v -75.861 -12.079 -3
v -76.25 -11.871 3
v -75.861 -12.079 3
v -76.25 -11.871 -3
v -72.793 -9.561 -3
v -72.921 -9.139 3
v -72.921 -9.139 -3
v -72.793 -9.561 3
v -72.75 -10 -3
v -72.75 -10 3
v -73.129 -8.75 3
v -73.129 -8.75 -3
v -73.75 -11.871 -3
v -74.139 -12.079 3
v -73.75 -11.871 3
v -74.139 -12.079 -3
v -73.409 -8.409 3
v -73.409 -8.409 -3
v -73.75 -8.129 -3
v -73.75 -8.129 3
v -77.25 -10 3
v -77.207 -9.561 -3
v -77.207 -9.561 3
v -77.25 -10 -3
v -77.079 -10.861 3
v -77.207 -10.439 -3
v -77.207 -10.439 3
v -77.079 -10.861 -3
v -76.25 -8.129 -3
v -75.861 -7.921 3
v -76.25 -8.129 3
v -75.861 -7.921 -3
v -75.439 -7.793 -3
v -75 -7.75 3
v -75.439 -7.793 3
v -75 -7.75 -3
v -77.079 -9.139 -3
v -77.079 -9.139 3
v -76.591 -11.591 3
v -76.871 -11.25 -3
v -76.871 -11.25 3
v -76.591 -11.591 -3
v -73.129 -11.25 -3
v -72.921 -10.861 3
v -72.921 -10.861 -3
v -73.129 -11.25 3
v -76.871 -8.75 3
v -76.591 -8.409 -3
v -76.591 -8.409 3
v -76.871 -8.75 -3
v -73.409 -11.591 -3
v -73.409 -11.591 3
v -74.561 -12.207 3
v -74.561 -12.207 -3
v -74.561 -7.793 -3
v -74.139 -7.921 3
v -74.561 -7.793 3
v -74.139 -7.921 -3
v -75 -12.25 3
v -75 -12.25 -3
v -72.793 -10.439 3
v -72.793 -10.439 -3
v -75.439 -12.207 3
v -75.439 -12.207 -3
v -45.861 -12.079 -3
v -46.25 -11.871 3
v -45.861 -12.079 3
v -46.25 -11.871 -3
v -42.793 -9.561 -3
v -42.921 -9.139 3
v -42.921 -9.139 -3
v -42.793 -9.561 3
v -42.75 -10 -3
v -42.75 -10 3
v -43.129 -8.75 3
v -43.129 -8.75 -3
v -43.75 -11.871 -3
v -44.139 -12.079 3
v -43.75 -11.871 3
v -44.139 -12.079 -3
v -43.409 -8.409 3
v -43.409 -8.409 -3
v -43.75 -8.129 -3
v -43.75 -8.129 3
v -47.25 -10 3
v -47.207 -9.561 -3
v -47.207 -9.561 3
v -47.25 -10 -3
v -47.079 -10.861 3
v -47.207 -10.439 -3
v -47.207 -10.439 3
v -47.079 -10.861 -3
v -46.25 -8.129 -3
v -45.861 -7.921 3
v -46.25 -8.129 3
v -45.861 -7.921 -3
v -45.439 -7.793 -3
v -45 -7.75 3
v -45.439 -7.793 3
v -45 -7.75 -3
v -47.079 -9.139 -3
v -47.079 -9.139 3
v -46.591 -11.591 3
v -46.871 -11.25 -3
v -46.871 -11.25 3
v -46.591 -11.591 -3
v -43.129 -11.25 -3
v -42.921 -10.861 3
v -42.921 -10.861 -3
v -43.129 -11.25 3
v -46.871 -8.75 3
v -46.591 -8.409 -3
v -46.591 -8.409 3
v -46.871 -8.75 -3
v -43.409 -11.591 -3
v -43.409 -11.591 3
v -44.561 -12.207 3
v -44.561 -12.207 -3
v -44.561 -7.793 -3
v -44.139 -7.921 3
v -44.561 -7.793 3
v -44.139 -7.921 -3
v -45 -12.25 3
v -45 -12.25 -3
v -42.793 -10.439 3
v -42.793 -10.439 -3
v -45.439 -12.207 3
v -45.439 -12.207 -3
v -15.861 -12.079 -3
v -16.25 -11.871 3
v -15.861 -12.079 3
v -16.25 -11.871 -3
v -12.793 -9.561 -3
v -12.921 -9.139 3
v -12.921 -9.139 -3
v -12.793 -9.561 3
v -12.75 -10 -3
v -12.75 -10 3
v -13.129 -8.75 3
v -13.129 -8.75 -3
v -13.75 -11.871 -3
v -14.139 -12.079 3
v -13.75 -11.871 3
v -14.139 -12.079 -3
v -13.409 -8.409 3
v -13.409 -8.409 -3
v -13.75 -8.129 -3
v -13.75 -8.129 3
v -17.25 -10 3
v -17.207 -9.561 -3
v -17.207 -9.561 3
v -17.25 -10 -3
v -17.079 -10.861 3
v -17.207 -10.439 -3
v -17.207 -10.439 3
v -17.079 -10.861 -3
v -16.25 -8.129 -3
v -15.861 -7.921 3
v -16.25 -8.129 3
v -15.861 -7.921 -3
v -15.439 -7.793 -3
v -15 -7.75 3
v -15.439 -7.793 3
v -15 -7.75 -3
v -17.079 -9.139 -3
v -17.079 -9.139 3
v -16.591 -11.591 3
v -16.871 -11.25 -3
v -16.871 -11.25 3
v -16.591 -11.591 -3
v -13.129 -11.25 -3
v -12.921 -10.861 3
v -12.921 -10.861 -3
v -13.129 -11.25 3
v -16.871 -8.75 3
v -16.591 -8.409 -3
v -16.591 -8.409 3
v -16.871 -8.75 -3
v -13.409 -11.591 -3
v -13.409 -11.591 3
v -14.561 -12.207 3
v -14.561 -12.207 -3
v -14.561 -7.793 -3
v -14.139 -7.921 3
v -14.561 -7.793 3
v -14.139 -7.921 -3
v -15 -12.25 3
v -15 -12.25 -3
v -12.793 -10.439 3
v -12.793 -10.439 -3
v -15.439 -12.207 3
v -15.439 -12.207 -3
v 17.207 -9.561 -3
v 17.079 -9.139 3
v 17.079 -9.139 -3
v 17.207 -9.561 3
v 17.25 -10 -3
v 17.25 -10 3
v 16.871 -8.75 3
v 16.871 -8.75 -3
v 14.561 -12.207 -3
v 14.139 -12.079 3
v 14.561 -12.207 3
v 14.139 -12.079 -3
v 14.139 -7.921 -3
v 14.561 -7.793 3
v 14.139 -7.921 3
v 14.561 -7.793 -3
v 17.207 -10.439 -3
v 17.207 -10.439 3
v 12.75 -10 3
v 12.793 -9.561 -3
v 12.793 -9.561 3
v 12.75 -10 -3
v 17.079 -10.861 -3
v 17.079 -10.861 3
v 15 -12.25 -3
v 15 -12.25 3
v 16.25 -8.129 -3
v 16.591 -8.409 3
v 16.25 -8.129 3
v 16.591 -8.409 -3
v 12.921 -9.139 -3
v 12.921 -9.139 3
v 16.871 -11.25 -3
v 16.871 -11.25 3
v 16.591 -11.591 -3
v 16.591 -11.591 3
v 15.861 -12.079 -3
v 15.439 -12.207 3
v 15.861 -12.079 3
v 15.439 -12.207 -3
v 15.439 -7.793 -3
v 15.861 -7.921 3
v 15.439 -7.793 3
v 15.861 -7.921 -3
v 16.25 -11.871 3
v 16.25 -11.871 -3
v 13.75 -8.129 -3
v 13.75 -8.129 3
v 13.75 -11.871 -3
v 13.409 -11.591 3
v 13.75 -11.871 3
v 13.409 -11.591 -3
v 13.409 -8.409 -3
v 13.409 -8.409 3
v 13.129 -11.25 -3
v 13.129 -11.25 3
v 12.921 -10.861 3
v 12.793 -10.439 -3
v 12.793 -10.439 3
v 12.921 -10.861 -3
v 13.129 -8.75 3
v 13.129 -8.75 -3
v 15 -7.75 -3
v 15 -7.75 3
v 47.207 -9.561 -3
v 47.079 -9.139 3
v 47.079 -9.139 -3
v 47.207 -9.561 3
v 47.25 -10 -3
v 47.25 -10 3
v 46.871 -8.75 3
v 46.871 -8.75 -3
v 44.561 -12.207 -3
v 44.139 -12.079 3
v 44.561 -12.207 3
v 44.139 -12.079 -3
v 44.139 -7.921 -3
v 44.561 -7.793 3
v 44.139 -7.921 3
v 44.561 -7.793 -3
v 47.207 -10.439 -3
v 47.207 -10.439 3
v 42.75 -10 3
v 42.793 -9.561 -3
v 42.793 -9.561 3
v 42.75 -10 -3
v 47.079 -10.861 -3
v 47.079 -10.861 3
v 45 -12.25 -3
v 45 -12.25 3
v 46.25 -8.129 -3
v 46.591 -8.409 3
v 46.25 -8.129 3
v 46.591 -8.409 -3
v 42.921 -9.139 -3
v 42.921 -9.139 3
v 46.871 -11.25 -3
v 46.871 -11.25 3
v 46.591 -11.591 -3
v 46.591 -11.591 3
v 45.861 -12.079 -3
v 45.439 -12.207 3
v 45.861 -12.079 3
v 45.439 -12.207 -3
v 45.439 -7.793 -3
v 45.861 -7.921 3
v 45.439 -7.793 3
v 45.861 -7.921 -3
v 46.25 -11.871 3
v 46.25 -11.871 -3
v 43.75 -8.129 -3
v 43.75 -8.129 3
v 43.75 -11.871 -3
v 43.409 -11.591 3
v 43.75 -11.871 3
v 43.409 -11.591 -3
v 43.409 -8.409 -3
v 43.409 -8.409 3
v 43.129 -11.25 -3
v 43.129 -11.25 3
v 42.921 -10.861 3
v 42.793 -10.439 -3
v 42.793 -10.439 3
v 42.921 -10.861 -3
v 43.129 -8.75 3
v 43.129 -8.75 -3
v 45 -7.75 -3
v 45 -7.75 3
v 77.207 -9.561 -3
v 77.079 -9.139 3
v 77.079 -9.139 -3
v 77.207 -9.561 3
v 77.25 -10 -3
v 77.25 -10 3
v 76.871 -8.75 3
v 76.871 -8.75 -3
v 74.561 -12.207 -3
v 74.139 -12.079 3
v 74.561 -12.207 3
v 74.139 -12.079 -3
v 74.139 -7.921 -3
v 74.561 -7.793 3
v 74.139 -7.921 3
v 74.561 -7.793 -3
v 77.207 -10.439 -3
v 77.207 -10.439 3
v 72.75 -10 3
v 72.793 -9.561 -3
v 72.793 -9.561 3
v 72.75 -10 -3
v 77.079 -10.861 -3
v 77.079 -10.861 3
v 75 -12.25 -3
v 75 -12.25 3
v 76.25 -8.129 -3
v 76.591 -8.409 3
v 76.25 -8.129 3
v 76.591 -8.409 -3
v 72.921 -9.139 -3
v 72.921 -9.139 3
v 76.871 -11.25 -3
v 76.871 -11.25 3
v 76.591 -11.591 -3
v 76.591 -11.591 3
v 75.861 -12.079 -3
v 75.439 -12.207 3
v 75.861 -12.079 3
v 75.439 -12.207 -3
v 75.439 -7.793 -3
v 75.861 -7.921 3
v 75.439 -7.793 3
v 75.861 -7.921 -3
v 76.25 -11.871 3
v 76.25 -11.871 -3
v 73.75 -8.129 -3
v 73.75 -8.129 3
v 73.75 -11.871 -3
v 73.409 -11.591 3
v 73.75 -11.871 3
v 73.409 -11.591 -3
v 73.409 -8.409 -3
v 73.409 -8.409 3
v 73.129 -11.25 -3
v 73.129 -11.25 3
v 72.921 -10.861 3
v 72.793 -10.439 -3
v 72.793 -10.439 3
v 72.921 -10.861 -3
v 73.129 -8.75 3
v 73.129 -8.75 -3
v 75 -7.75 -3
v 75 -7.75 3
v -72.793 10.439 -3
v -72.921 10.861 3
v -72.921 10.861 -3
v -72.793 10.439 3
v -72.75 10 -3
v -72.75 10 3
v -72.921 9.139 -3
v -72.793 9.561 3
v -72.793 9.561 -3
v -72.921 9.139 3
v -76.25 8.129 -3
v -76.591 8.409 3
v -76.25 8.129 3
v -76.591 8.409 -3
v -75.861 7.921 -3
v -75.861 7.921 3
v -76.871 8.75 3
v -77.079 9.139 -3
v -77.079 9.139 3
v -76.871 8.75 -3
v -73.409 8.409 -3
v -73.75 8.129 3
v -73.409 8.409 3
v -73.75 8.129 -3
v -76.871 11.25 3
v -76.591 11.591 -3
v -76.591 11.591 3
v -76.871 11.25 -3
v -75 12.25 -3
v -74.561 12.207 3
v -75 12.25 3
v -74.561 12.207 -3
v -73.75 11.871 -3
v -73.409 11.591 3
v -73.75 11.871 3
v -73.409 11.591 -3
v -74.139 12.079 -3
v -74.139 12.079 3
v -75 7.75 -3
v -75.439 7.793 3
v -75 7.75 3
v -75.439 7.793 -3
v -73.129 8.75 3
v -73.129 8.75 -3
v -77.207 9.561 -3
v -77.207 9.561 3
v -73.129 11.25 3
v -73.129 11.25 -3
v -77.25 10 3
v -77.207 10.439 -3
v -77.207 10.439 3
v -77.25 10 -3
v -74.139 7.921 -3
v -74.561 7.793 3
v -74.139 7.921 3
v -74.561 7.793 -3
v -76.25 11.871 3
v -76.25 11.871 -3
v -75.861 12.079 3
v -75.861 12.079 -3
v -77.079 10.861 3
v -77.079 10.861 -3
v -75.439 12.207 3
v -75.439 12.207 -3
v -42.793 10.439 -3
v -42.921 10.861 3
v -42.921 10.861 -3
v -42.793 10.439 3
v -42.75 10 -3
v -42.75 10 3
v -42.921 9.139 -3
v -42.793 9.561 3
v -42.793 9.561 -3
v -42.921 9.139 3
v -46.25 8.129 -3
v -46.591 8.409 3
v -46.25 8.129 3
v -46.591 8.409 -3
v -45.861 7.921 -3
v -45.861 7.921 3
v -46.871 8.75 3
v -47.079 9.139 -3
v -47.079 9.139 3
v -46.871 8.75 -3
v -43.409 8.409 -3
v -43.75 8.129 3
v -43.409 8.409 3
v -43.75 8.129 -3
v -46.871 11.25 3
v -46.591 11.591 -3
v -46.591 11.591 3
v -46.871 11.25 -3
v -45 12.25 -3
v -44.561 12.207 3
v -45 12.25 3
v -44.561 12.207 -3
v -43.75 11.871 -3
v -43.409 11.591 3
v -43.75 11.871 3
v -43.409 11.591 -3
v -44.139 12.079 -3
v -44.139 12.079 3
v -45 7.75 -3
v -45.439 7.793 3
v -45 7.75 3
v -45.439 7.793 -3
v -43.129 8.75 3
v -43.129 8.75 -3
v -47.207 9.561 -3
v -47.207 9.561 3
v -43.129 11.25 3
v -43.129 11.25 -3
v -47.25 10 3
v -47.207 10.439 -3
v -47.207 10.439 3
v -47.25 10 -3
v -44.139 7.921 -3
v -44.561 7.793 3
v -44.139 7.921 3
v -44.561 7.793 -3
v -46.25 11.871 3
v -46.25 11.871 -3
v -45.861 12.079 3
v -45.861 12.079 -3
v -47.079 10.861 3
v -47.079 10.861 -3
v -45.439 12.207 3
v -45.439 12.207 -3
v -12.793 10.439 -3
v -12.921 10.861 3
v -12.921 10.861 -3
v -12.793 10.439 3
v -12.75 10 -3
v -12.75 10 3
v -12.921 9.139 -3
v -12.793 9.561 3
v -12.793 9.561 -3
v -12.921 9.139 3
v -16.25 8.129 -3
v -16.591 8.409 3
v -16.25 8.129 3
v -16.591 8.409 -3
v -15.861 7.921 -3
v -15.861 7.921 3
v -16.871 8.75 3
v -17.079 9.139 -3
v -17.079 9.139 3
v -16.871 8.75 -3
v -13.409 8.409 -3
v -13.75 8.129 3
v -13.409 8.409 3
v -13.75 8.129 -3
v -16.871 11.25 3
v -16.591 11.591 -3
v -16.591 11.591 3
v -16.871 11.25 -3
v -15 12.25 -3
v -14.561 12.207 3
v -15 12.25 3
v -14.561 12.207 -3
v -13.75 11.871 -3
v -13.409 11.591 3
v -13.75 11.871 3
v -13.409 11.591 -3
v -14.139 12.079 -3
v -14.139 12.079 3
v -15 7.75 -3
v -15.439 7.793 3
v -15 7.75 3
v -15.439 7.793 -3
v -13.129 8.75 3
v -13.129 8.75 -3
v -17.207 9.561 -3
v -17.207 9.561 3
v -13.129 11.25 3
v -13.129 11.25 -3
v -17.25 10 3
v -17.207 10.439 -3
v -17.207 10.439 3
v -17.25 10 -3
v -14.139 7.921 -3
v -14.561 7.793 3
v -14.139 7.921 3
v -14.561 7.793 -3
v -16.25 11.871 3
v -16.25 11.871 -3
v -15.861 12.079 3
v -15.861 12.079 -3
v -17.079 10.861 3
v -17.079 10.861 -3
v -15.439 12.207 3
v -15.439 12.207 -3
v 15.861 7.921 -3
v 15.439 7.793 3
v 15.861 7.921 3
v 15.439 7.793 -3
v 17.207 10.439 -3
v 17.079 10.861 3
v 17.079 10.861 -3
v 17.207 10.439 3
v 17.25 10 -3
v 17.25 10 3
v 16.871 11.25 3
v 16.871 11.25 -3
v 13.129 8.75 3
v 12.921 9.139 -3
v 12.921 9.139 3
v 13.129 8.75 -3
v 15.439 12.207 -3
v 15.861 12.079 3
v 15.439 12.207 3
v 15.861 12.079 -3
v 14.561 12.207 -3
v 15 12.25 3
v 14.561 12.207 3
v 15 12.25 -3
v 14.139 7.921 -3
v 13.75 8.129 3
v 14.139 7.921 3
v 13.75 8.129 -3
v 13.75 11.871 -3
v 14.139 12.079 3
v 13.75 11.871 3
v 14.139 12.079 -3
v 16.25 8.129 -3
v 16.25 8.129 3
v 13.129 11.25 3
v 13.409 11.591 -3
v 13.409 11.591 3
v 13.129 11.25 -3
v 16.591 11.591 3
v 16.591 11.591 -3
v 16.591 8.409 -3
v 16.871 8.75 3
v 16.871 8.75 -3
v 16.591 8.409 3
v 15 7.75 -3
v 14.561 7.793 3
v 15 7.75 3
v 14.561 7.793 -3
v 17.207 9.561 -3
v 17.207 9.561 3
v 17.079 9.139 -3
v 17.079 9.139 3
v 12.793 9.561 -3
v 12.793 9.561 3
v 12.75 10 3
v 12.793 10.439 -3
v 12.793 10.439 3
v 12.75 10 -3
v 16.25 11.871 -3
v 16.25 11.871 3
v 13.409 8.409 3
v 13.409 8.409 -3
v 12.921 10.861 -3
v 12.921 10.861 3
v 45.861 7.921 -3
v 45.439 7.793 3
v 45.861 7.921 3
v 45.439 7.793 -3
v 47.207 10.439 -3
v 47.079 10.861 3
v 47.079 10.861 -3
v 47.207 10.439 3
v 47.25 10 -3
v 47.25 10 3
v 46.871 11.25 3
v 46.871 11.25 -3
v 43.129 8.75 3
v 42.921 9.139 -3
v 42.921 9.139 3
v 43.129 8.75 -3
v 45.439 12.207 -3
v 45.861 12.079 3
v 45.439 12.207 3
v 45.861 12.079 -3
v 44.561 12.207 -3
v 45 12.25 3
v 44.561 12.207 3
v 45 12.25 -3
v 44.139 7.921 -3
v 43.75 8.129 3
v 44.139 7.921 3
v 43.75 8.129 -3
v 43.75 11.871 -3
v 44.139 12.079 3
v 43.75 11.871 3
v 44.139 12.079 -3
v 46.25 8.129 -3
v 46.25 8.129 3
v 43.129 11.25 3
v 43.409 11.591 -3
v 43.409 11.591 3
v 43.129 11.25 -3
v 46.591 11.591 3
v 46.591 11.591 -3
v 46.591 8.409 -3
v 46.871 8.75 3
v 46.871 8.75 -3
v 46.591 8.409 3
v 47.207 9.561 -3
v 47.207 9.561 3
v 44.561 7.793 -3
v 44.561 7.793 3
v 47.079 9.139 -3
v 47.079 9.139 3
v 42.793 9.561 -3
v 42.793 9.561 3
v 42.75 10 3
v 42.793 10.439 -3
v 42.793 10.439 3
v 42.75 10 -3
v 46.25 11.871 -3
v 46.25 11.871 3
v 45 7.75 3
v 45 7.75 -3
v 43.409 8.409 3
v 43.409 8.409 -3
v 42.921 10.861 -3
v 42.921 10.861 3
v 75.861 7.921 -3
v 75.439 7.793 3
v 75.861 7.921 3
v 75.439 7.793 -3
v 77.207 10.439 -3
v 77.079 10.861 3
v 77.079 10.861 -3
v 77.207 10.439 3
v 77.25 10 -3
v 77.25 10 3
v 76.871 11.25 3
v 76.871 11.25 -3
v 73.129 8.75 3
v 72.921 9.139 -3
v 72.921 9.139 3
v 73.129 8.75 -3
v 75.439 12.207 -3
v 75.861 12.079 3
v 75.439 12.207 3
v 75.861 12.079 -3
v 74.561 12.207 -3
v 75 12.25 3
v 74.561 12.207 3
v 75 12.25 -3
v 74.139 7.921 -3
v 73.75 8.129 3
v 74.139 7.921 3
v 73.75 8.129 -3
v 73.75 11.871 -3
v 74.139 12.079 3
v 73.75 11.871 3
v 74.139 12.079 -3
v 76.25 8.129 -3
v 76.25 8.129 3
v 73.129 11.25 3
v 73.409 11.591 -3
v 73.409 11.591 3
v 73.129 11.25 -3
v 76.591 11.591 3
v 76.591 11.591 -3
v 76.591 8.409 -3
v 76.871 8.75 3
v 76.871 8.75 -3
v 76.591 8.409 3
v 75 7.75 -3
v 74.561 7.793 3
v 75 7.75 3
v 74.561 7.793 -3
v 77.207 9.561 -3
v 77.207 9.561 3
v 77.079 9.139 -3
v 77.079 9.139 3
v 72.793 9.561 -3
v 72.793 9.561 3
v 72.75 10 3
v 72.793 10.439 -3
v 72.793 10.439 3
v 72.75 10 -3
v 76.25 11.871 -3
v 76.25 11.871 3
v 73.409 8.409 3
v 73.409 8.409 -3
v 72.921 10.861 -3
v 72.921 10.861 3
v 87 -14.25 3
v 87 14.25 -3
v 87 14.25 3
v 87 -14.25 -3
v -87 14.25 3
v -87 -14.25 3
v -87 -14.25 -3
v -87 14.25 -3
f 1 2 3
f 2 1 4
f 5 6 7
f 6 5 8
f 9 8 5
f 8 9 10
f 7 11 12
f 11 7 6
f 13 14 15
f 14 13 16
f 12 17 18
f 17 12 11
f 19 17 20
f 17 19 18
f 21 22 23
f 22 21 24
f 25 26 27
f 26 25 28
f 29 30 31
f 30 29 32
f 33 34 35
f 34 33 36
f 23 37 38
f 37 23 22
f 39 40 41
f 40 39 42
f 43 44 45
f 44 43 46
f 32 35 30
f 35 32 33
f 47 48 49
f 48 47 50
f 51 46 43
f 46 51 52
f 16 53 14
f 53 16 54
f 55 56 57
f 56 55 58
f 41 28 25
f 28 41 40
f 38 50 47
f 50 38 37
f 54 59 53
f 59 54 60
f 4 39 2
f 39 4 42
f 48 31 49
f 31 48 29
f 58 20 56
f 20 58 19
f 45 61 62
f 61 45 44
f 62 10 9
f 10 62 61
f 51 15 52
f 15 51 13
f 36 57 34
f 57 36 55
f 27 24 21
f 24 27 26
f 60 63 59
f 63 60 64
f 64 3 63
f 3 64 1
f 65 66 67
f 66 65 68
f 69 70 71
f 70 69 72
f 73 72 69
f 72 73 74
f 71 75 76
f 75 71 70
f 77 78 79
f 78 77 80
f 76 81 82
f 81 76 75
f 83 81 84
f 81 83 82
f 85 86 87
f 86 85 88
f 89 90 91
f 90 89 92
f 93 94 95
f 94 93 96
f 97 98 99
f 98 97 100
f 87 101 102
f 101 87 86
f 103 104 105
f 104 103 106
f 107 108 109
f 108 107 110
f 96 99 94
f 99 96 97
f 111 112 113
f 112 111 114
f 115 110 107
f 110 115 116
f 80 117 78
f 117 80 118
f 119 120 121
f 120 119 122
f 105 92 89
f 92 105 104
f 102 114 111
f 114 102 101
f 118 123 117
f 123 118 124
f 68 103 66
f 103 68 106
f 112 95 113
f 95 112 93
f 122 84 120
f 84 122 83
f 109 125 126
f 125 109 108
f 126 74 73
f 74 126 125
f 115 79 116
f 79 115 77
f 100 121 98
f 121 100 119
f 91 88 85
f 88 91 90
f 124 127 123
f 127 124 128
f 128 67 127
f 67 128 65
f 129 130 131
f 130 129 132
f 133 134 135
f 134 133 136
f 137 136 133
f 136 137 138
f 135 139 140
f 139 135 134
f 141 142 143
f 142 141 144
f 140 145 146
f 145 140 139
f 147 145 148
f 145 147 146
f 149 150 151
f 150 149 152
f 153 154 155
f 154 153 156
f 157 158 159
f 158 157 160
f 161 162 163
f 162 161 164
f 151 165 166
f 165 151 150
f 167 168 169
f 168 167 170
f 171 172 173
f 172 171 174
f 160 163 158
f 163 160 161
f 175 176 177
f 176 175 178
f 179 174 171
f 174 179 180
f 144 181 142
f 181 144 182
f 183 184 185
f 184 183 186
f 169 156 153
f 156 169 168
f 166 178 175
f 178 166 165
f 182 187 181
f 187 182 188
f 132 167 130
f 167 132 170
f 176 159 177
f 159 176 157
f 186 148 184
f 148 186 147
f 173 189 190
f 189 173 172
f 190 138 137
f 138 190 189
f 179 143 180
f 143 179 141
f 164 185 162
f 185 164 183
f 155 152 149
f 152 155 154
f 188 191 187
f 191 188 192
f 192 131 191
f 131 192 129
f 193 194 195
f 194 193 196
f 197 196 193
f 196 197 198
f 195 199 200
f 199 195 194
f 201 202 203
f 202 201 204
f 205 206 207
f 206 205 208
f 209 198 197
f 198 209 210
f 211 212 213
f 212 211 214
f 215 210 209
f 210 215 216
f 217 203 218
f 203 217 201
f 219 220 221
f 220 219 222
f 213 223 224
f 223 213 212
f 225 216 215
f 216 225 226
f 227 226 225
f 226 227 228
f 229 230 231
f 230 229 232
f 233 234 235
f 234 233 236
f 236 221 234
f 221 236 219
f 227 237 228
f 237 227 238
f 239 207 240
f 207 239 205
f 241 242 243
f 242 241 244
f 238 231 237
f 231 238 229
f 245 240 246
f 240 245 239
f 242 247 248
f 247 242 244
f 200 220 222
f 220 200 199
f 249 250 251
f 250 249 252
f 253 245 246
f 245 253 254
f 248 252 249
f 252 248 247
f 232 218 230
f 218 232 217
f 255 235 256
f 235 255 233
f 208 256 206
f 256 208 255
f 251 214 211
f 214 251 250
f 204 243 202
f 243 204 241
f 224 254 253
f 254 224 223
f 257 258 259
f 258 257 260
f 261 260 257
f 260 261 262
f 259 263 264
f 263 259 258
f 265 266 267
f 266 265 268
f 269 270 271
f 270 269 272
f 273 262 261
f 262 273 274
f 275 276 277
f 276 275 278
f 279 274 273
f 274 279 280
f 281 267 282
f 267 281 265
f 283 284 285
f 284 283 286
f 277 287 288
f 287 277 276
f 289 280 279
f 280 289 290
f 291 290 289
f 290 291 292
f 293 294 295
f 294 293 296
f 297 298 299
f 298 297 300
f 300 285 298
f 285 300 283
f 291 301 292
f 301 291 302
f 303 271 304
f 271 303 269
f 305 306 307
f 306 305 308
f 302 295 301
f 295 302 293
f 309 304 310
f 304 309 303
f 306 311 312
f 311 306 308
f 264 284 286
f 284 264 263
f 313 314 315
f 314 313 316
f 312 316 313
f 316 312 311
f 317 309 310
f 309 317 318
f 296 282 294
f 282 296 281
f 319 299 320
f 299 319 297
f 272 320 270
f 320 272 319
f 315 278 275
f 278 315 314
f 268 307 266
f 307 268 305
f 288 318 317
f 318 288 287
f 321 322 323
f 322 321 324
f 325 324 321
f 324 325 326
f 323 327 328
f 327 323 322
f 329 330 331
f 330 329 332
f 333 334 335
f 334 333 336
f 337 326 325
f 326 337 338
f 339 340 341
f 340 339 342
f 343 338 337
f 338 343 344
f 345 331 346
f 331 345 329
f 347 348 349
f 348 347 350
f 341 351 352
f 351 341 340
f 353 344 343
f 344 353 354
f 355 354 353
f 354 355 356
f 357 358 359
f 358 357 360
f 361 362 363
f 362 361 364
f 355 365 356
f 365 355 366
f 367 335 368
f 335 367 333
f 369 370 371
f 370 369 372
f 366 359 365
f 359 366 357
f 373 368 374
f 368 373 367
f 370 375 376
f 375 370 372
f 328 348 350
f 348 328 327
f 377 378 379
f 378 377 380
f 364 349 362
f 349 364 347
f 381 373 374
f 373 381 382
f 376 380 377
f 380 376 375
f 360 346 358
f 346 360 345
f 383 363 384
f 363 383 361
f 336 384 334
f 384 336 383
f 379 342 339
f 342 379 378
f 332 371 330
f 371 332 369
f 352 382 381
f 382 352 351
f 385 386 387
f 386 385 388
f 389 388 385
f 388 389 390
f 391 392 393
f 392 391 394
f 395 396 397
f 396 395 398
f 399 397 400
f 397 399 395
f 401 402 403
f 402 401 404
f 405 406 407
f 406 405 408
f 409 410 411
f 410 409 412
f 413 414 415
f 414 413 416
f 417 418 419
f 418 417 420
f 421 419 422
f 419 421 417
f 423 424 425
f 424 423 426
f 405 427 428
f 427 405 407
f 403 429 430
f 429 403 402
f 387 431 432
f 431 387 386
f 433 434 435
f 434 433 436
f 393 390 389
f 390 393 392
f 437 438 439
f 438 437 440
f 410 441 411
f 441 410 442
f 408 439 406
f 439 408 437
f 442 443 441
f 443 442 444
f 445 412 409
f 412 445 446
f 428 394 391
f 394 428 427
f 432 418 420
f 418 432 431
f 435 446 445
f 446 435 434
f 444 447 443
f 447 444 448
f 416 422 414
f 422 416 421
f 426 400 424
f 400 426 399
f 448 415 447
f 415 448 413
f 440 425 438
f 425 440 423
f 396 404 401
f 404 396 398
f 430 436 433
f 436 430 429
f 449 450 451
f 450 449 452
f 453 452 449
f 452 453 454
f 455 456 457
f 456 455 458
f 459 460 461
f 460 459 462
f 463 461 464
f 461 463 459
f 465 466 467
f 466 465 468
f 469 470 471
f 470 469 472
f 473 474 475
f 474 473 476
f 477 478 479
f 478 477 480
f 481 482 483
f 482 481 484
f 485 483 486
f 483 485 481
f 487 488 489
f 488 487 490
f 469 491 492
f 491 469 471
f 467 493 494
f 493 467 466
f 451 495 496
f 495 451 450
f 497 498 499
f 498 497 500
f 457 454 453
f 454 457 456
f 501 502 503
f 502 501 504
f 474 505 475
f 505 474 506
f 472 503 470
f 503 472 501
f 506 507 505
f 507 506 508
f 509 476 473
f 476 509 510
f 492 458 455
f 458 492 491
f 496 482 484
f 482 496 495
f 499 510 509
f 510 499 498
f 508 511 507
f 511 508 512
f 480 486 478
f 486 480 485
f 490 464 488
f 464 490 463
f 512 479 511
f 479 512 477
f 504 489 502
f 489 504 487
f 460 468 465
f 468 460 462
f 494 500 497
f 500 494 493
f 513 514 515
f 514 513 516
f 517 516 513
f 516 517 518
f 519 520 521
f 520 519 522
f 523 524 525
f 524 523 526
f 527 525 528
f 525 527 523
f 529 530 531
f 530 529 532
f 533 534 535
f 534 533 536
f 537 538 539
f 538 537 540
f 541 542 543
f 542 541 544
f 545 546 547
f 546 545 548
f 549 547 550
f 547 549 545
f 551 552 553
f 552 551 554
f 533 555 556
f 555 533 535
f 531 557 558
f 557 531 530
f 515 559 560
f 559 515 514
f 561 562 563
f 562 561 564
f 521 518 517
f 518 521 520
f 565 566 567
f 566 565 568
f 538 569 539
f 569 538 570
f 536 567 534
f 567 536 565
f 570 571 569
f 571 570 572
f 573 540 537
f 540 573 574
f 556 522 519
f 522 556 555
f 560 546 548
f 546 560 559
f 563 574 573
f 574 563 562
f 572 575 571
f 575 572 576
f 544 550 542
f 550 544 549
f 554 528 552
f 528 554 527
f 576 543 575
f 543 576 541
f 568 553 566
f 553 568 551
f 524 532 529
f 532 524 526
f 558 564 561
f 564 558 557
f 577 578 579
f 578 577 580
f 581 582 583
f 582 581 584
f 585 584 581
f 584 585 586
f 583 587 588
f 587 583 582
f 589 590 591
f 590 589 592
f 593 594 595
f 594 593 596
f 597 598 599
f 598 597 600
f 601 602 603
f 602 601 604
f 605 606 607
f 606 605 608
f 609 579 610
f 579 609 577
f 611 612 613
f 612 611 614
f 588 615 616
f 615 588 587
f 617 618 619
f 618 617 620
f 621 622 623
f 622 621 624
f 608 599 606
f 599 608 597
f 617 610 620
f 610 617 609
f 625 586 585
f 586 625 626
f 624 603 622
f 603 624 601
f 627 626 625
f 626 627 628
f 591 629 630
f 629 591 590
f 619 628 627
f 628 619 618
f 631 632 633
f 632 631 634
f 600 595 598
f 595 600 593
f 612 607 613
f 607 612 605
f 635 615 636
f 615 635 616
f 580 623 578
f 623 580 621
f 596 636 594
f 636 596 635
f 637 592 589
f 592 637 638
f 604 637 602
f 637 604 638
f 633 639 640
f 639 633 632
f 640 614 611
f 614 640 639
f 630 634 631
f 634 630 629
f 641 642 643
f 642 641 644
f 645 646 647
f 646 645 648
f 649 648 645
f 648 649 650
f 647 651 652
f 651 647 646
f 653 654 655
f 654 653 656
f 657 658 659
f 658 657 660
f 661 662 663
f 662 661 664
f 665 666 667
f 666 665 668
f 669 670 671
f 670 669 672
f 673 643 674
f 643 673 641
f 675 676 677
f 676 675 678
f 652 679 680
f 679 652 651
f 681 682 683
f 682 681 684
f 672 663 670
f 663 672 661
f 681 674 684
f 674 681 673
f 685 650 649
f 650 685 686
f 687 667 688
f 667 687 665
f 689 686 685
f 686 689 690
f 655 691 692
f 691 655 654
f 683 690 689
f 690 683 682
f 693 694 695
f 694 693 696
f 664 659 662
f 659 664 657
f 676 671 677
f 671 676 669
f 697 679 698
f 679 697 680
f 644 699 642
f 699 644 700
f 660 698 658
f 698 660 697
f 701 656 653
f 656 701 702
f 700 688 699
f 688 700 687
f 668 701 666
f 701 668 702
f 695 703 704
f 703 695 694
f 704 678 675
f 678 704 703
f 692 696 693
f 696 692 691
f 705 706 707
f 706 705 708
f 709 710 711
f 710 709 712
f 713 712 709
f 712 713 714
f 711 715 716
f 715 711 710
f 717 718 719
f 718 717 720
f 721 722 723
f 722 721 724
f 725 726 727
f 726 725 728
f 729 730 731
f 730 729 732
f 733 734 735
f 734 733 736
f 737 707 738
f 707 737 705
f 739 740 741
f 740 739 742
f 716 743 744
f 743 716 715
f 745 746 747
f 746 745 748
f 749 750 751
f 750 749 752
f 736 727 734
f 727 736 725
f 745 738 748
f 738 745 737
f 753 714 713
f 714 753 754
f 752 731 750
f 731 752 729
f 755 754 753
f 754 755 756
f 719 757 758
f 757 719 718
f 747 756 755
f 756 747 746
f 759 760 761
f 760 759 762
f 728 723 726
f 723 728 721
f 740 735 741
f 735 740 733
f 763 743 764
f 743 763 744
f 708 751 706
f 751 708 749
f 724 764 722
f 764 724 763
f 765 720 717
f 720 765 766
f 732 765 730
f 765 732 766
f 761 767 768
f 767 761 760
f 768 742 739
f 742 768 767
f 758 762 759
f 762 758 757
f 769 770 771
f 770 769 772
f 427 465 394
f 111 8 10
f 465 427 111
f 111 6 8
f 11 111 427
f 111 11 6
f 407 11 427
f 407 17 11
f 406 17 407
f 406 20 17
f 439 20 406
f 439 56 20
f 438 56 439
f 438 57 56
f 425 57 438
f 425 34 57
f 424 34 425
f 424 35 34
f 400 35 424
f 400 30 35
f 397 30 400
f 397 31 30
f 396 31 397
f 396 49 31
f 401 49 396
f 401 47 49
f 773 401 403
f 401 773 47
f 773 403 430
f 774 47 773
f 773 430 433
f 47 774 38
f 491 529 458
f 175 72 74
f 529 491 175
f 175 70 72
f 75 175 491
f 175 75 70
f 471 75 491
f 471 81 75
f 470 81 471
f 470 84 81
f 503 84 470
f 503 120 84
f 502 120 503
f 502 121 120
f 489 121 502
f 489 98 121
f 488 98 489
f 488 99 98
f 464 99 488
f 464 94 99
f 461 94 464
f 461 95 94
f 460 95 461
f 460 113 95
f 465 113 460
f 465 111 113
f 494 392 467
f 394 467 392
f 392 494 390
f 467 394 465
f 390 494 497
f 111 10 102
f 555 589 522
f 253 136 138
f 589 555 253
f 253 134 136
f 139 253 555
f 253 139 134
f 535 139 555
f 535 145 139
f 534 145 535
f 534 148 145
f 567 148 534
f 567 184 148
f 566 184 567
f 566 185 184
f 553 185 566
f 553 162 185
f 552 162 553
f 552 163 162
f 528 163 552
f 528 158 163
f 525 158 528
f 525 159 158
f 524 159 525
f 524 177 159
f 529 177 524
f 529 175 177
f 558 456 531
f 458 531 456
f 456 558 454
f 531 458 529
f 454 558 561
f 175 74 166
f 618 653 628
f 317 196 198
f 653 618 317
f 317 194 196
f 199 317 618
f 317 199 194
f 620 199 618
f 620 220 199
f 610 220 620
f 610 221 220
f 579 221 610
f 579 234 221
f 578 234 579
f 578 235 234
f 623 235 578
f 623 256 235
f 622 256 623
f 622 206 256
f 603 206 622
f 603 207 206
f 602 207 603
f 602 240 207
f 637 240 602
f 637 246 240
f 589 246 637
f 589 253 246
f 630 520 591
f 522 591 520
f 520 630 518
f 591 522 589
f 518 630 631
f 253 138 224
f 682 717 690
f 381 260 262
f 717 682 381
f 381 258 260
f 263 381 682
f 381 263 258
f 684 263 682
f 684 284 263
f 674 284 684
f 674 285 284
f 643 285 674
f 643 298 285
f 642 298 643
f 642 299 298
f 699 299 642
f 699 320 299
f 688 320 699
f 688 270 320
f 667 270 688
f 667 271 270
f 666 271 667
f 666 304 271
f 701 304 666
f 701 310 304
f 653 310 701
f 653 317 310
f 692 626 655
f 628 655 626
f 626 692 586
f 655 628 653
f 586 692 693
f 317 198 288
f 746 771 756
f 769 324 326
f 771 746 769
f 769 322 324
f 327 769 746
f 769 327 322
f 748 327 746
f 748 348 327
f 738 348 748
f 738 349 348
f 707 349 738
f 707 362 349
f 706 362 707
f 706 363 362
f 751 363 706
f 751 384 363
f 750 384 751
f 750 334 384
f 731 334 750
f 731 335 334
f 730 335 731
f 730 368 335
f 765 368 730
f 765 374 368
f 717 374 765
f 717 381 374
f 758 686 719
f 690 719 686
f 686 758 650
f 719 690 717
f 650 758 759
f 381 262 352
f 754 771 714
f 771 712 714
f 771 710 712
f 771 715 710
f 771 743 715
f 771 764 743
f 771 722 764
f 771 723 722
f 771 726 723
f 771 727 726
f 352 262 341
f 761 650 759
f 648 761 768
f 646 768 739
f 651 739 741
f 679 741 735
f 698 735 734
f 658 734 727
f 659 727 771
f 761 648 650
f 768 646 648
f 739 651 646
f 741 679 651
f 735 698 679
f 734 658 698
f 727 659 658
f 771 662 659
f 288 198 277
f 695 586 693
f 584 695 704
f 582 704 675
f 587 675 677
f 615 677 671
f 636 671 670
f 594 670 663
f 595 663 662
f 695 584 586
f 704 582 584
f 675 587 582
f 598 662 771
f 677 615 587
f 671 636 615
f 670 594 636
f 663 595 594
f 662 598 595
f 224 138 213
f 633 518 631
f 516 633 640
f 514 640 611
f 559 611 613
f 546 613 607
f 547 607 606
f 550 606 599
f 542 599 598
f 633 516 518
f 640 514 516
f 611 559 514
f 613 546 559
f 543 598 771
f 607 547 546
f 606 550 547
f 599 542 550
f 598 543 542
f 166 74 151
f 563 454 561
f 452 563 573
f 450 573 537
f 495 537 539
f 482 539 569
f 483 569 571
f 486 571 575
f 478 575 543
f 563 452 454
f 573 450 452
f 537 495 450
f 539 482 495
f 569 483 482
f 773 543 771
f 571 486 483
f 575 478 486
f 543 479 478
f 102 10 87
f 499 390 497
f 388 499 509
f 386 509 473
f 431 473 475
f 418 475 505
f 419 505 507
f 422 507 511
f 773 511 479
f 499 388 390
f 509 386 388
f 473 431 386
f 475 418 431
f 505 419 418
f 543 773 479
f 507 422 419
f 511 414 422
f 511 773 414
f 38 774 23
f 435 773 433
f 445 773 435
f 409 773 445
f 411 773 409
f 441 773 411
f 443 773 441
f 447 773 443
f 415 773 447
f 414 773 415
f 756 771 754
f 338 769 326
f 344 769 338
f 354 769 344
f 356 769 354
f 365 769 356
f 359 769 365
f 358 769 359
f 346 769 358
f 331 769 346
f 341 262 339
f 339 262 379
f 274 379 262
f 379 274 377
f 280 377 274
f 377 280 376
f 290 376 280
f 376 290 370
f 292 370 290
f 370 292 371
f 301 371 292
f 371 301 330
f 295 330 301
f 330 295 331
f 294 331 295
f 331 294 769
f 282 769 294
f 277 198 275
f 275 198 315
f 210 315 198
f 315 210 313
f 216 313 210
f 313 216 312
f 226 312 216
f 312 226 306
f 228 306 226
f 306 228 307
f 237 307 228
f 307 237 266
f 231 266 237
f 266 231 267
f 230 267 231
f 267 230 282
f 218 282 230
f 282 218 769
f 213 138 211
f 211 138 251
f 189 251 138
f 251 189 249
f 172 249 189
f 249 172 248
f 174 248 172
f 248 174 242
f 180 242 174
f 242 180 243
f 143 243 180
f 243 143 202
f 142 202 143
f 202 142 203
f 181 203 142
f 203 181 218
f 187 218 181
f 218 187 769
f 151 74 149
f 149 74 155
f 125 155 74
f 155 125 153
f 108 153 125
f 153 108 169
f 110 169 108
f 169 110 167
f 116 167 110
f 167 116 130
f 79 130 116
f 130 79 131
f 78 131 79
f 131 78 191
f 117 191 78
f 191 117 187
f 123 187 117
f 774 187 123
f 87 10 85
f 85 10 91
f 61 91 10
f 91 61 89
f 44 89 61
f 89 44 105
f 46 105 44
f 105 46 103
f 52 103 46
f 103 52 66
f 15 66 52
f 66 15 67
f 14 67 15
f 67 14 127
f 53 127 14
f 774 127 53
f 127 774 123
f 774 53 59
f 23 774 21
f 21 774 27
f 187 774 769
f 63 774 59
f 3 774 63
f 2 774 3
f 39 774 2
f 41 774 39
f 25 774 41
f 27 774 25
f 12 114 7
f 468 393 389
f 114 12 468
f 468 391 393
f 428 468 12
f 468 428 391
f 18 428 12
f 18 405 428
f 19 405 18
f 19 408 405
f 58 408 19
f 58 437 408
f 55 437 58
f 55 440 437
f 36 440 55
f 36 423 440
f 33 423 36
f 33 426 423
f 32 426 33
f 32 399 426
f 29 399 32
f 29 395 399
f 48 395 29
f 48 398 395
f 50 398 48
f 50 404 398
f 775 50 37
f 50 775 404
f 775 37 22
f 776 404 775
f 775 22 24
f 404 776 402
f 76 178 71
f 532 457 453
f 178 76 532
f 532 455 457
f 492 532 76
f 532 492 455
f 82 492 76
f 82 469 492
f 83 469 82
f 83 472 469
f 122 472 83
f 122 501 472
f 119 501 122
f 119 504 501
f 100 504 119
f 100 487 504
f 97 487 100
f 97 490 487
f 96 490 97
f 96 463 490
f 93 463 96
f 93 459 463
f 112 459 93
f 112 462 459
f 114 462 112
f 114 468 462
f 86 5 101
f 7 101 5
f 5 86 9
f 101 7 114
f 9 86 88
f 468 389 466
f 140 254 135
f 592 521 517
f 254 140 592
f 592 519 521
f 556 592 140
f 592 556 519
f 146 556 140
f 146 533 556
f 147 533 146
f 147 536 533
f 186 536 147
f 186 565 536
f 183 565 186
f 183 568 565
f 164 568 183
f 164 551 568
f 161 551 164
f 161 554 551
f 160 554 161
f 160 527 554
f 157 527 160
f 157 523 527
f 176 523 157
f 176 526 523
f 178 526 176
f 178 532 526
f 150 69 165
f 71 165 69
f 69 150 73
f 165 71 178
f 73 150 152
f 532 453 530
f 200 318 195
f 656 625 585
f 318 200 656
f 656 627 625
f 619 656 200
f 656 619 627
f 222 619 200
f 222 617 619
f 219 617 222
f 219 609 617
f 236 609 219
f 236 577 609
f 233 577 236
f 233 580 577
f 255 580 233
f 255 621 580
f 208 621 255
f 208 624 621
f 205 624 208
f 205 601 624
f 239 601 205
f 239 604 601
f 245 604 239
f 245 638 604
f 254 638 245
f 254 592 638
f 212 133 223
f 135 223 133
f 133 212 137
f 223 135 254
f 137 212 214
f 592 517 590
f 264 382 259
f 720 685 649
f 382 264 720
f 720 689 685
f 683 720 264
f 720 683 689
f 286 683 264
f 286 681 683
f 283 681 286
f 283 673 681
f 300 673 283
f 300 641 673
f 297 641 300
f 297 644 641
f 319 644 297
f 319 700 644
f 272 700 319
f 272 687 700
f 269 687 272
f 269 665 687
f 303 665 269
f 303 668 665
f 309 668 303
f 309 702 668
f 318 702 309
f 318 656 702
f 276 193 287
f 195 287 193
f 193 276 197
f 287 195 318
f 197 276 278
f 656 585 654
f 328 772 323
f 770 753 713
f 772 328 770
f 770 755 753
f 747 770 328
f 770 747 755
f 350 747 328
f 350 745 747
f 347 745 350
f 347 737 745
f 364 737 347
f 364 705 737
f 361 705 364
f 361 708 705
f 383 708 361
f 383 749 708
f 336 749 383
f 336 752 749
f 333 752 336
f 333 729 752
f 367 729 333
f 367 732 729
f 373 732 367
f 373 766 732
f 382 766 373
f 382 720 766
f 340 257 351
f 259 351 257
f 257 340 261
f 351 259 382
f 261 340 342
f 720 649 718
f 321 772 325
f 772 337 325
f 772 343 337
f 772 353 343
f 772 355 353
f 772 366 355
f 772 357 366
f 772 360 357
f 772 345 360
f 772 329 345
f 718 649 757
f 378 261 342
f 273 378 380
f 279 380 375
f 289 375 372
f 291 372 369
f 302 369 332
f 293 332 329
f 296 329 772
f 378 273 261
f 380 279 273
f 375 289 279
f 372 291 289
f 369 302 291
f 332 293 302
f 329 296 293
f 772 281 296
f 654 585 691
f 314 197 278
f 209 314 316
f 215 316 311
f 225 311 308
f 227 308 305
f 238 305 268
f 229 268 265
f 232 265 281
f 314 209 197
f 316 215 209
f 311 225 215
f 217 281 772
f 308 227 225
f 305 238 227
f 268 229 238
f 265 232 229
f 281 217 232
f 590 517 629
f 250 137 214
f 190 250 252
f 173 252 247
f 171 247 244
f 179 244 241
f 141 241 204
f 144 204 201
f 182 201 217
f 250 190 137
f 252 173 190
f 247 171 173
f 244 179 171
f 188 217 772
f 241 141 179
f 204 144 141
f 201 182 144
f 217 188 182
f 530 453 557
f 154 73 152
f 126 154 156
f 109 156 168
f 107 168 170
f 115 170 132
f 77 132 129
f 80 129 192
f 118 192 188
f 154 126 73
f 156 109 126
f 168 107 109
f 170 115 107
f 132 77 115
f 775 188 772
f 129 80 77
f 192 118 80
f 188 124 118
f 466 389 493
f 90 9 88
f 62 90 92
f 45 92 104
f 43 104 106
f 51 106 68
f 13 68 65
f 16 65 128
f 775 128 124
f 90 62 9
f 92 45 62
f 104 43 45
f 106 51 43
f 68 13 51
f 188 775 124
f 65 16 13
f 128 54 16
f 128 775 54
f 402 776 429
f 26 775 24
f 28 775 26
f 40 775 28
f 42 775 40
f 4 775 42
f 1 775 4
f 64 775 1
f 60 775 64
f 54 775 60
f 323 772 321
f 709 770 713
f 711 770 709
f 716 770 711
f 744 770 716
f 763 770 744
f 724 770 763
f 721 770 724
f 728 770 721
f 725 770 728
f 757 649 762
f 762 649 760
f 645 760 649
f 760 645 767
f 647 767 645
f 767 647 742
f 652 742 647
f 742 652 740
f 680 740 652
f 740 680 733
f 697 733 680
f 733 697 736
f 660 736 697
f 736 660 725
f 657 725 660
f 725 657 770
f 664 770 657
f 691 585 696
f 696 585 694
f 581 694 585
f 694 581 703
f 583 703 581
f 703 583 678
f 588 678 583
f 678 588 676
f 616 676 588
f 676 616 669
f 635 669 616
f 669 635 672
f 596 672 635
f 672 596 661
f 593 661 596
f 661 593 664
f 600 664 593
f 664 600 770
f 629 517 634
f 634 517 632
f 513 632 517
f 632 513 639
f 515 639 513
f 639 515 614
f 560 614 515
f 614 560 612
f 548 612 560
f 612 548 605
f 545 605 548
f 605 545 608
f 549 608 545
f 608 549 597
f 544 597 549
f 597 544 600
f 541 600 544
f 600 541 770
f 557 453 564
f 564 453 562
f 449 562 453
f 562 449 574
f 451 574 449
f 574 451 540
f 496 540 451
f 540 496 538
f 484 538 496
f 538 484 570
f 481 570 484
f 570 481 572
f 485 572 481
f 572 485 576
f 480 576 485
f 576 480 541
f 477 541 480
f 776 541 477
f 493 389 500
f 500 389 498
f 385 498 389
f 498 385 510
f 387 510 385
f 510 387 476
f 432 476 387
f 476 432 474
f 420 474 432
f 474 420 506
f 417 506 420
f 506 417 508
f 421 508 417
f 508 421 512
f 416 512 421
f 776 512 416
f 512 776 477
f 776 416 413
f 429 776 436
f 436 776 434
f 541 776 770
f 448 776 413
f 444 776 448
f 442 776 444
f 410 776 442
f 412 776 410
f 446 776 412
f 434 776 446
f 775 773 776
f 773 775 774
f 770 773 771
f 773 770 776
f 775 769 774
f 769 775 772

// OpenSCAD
$fn = 32;

// ----------------------------------------------------------------------
// Hole bar, 6 x Ø4.5
// tworows layout, 12 mm edge offset
// ----------------------------------------------------------------------

// --- parameters (mm) ---
bar_w = 28.5;     // bar width (Y)
bar_t = 6;        // bar thickness (Z)
holes = 6;        // holes per row
hole_d = 4.5;     // hole diameter
edge = 12;        // offset from the bar end to the first hole
pitch = 30;       // pitch between neighbouring holes
row_offset = 20;  // distance between the two rows

// --- derived feature positions (mm) ---
span = (holes - 1) * pitch;   // = 150   distance between the end holes
bar_l = span + 2 * edge;      // = 174   overall bar length
start_x = -bar_l / 2 + edge;  // = -75   X of the first hole
feature_centers = [
  [start_x + 0 * pitch, -row_offset / 2],
  [start_x + 1 * pitch, -row_offset / 2],
  [start_x + 2 * pitch, -row_offset / 2],
  [start_x + 3 * pitch, -row_offset / 2],
  [start_x + 4 * pitch, -row_offset / 2],
  [start_x + 5 * pitch, -row_offset / 2]
];   // hole centres of the first row
row2_centers = [
  [start_x + 0 * pitch, row_offset / 2],
  [start_x + 1 * pitch, row_offset / 2],
  [start_x + 2 * pitch, row_offset / 2],
  [start_x + 3 * pitch, row_offset / 2],
  [start_x + 4 * pitch, row_offset / 2],
  [start_x + 5 * pitch, row_offset / 2]
];   // hole centres of the second row

// bar with two rows of holes, both read from their own centre arrays
difference() {
  translate([-bar_l / 2, -bar_w / 2, -bar_t / 2]) cube([bar_l, bar_w, bar_t]);
  for (centre = feature_centers)
    translate([centre[0], centre[1], 0])
      cylinder(d = hole_d, h = bar_t + 2, center = true);
  for (centre = row2_centers)
    translate([centre[0], centre[1], 0])
      cylinder(d = hole_d, h = bar_t + 2, center = true);
}
